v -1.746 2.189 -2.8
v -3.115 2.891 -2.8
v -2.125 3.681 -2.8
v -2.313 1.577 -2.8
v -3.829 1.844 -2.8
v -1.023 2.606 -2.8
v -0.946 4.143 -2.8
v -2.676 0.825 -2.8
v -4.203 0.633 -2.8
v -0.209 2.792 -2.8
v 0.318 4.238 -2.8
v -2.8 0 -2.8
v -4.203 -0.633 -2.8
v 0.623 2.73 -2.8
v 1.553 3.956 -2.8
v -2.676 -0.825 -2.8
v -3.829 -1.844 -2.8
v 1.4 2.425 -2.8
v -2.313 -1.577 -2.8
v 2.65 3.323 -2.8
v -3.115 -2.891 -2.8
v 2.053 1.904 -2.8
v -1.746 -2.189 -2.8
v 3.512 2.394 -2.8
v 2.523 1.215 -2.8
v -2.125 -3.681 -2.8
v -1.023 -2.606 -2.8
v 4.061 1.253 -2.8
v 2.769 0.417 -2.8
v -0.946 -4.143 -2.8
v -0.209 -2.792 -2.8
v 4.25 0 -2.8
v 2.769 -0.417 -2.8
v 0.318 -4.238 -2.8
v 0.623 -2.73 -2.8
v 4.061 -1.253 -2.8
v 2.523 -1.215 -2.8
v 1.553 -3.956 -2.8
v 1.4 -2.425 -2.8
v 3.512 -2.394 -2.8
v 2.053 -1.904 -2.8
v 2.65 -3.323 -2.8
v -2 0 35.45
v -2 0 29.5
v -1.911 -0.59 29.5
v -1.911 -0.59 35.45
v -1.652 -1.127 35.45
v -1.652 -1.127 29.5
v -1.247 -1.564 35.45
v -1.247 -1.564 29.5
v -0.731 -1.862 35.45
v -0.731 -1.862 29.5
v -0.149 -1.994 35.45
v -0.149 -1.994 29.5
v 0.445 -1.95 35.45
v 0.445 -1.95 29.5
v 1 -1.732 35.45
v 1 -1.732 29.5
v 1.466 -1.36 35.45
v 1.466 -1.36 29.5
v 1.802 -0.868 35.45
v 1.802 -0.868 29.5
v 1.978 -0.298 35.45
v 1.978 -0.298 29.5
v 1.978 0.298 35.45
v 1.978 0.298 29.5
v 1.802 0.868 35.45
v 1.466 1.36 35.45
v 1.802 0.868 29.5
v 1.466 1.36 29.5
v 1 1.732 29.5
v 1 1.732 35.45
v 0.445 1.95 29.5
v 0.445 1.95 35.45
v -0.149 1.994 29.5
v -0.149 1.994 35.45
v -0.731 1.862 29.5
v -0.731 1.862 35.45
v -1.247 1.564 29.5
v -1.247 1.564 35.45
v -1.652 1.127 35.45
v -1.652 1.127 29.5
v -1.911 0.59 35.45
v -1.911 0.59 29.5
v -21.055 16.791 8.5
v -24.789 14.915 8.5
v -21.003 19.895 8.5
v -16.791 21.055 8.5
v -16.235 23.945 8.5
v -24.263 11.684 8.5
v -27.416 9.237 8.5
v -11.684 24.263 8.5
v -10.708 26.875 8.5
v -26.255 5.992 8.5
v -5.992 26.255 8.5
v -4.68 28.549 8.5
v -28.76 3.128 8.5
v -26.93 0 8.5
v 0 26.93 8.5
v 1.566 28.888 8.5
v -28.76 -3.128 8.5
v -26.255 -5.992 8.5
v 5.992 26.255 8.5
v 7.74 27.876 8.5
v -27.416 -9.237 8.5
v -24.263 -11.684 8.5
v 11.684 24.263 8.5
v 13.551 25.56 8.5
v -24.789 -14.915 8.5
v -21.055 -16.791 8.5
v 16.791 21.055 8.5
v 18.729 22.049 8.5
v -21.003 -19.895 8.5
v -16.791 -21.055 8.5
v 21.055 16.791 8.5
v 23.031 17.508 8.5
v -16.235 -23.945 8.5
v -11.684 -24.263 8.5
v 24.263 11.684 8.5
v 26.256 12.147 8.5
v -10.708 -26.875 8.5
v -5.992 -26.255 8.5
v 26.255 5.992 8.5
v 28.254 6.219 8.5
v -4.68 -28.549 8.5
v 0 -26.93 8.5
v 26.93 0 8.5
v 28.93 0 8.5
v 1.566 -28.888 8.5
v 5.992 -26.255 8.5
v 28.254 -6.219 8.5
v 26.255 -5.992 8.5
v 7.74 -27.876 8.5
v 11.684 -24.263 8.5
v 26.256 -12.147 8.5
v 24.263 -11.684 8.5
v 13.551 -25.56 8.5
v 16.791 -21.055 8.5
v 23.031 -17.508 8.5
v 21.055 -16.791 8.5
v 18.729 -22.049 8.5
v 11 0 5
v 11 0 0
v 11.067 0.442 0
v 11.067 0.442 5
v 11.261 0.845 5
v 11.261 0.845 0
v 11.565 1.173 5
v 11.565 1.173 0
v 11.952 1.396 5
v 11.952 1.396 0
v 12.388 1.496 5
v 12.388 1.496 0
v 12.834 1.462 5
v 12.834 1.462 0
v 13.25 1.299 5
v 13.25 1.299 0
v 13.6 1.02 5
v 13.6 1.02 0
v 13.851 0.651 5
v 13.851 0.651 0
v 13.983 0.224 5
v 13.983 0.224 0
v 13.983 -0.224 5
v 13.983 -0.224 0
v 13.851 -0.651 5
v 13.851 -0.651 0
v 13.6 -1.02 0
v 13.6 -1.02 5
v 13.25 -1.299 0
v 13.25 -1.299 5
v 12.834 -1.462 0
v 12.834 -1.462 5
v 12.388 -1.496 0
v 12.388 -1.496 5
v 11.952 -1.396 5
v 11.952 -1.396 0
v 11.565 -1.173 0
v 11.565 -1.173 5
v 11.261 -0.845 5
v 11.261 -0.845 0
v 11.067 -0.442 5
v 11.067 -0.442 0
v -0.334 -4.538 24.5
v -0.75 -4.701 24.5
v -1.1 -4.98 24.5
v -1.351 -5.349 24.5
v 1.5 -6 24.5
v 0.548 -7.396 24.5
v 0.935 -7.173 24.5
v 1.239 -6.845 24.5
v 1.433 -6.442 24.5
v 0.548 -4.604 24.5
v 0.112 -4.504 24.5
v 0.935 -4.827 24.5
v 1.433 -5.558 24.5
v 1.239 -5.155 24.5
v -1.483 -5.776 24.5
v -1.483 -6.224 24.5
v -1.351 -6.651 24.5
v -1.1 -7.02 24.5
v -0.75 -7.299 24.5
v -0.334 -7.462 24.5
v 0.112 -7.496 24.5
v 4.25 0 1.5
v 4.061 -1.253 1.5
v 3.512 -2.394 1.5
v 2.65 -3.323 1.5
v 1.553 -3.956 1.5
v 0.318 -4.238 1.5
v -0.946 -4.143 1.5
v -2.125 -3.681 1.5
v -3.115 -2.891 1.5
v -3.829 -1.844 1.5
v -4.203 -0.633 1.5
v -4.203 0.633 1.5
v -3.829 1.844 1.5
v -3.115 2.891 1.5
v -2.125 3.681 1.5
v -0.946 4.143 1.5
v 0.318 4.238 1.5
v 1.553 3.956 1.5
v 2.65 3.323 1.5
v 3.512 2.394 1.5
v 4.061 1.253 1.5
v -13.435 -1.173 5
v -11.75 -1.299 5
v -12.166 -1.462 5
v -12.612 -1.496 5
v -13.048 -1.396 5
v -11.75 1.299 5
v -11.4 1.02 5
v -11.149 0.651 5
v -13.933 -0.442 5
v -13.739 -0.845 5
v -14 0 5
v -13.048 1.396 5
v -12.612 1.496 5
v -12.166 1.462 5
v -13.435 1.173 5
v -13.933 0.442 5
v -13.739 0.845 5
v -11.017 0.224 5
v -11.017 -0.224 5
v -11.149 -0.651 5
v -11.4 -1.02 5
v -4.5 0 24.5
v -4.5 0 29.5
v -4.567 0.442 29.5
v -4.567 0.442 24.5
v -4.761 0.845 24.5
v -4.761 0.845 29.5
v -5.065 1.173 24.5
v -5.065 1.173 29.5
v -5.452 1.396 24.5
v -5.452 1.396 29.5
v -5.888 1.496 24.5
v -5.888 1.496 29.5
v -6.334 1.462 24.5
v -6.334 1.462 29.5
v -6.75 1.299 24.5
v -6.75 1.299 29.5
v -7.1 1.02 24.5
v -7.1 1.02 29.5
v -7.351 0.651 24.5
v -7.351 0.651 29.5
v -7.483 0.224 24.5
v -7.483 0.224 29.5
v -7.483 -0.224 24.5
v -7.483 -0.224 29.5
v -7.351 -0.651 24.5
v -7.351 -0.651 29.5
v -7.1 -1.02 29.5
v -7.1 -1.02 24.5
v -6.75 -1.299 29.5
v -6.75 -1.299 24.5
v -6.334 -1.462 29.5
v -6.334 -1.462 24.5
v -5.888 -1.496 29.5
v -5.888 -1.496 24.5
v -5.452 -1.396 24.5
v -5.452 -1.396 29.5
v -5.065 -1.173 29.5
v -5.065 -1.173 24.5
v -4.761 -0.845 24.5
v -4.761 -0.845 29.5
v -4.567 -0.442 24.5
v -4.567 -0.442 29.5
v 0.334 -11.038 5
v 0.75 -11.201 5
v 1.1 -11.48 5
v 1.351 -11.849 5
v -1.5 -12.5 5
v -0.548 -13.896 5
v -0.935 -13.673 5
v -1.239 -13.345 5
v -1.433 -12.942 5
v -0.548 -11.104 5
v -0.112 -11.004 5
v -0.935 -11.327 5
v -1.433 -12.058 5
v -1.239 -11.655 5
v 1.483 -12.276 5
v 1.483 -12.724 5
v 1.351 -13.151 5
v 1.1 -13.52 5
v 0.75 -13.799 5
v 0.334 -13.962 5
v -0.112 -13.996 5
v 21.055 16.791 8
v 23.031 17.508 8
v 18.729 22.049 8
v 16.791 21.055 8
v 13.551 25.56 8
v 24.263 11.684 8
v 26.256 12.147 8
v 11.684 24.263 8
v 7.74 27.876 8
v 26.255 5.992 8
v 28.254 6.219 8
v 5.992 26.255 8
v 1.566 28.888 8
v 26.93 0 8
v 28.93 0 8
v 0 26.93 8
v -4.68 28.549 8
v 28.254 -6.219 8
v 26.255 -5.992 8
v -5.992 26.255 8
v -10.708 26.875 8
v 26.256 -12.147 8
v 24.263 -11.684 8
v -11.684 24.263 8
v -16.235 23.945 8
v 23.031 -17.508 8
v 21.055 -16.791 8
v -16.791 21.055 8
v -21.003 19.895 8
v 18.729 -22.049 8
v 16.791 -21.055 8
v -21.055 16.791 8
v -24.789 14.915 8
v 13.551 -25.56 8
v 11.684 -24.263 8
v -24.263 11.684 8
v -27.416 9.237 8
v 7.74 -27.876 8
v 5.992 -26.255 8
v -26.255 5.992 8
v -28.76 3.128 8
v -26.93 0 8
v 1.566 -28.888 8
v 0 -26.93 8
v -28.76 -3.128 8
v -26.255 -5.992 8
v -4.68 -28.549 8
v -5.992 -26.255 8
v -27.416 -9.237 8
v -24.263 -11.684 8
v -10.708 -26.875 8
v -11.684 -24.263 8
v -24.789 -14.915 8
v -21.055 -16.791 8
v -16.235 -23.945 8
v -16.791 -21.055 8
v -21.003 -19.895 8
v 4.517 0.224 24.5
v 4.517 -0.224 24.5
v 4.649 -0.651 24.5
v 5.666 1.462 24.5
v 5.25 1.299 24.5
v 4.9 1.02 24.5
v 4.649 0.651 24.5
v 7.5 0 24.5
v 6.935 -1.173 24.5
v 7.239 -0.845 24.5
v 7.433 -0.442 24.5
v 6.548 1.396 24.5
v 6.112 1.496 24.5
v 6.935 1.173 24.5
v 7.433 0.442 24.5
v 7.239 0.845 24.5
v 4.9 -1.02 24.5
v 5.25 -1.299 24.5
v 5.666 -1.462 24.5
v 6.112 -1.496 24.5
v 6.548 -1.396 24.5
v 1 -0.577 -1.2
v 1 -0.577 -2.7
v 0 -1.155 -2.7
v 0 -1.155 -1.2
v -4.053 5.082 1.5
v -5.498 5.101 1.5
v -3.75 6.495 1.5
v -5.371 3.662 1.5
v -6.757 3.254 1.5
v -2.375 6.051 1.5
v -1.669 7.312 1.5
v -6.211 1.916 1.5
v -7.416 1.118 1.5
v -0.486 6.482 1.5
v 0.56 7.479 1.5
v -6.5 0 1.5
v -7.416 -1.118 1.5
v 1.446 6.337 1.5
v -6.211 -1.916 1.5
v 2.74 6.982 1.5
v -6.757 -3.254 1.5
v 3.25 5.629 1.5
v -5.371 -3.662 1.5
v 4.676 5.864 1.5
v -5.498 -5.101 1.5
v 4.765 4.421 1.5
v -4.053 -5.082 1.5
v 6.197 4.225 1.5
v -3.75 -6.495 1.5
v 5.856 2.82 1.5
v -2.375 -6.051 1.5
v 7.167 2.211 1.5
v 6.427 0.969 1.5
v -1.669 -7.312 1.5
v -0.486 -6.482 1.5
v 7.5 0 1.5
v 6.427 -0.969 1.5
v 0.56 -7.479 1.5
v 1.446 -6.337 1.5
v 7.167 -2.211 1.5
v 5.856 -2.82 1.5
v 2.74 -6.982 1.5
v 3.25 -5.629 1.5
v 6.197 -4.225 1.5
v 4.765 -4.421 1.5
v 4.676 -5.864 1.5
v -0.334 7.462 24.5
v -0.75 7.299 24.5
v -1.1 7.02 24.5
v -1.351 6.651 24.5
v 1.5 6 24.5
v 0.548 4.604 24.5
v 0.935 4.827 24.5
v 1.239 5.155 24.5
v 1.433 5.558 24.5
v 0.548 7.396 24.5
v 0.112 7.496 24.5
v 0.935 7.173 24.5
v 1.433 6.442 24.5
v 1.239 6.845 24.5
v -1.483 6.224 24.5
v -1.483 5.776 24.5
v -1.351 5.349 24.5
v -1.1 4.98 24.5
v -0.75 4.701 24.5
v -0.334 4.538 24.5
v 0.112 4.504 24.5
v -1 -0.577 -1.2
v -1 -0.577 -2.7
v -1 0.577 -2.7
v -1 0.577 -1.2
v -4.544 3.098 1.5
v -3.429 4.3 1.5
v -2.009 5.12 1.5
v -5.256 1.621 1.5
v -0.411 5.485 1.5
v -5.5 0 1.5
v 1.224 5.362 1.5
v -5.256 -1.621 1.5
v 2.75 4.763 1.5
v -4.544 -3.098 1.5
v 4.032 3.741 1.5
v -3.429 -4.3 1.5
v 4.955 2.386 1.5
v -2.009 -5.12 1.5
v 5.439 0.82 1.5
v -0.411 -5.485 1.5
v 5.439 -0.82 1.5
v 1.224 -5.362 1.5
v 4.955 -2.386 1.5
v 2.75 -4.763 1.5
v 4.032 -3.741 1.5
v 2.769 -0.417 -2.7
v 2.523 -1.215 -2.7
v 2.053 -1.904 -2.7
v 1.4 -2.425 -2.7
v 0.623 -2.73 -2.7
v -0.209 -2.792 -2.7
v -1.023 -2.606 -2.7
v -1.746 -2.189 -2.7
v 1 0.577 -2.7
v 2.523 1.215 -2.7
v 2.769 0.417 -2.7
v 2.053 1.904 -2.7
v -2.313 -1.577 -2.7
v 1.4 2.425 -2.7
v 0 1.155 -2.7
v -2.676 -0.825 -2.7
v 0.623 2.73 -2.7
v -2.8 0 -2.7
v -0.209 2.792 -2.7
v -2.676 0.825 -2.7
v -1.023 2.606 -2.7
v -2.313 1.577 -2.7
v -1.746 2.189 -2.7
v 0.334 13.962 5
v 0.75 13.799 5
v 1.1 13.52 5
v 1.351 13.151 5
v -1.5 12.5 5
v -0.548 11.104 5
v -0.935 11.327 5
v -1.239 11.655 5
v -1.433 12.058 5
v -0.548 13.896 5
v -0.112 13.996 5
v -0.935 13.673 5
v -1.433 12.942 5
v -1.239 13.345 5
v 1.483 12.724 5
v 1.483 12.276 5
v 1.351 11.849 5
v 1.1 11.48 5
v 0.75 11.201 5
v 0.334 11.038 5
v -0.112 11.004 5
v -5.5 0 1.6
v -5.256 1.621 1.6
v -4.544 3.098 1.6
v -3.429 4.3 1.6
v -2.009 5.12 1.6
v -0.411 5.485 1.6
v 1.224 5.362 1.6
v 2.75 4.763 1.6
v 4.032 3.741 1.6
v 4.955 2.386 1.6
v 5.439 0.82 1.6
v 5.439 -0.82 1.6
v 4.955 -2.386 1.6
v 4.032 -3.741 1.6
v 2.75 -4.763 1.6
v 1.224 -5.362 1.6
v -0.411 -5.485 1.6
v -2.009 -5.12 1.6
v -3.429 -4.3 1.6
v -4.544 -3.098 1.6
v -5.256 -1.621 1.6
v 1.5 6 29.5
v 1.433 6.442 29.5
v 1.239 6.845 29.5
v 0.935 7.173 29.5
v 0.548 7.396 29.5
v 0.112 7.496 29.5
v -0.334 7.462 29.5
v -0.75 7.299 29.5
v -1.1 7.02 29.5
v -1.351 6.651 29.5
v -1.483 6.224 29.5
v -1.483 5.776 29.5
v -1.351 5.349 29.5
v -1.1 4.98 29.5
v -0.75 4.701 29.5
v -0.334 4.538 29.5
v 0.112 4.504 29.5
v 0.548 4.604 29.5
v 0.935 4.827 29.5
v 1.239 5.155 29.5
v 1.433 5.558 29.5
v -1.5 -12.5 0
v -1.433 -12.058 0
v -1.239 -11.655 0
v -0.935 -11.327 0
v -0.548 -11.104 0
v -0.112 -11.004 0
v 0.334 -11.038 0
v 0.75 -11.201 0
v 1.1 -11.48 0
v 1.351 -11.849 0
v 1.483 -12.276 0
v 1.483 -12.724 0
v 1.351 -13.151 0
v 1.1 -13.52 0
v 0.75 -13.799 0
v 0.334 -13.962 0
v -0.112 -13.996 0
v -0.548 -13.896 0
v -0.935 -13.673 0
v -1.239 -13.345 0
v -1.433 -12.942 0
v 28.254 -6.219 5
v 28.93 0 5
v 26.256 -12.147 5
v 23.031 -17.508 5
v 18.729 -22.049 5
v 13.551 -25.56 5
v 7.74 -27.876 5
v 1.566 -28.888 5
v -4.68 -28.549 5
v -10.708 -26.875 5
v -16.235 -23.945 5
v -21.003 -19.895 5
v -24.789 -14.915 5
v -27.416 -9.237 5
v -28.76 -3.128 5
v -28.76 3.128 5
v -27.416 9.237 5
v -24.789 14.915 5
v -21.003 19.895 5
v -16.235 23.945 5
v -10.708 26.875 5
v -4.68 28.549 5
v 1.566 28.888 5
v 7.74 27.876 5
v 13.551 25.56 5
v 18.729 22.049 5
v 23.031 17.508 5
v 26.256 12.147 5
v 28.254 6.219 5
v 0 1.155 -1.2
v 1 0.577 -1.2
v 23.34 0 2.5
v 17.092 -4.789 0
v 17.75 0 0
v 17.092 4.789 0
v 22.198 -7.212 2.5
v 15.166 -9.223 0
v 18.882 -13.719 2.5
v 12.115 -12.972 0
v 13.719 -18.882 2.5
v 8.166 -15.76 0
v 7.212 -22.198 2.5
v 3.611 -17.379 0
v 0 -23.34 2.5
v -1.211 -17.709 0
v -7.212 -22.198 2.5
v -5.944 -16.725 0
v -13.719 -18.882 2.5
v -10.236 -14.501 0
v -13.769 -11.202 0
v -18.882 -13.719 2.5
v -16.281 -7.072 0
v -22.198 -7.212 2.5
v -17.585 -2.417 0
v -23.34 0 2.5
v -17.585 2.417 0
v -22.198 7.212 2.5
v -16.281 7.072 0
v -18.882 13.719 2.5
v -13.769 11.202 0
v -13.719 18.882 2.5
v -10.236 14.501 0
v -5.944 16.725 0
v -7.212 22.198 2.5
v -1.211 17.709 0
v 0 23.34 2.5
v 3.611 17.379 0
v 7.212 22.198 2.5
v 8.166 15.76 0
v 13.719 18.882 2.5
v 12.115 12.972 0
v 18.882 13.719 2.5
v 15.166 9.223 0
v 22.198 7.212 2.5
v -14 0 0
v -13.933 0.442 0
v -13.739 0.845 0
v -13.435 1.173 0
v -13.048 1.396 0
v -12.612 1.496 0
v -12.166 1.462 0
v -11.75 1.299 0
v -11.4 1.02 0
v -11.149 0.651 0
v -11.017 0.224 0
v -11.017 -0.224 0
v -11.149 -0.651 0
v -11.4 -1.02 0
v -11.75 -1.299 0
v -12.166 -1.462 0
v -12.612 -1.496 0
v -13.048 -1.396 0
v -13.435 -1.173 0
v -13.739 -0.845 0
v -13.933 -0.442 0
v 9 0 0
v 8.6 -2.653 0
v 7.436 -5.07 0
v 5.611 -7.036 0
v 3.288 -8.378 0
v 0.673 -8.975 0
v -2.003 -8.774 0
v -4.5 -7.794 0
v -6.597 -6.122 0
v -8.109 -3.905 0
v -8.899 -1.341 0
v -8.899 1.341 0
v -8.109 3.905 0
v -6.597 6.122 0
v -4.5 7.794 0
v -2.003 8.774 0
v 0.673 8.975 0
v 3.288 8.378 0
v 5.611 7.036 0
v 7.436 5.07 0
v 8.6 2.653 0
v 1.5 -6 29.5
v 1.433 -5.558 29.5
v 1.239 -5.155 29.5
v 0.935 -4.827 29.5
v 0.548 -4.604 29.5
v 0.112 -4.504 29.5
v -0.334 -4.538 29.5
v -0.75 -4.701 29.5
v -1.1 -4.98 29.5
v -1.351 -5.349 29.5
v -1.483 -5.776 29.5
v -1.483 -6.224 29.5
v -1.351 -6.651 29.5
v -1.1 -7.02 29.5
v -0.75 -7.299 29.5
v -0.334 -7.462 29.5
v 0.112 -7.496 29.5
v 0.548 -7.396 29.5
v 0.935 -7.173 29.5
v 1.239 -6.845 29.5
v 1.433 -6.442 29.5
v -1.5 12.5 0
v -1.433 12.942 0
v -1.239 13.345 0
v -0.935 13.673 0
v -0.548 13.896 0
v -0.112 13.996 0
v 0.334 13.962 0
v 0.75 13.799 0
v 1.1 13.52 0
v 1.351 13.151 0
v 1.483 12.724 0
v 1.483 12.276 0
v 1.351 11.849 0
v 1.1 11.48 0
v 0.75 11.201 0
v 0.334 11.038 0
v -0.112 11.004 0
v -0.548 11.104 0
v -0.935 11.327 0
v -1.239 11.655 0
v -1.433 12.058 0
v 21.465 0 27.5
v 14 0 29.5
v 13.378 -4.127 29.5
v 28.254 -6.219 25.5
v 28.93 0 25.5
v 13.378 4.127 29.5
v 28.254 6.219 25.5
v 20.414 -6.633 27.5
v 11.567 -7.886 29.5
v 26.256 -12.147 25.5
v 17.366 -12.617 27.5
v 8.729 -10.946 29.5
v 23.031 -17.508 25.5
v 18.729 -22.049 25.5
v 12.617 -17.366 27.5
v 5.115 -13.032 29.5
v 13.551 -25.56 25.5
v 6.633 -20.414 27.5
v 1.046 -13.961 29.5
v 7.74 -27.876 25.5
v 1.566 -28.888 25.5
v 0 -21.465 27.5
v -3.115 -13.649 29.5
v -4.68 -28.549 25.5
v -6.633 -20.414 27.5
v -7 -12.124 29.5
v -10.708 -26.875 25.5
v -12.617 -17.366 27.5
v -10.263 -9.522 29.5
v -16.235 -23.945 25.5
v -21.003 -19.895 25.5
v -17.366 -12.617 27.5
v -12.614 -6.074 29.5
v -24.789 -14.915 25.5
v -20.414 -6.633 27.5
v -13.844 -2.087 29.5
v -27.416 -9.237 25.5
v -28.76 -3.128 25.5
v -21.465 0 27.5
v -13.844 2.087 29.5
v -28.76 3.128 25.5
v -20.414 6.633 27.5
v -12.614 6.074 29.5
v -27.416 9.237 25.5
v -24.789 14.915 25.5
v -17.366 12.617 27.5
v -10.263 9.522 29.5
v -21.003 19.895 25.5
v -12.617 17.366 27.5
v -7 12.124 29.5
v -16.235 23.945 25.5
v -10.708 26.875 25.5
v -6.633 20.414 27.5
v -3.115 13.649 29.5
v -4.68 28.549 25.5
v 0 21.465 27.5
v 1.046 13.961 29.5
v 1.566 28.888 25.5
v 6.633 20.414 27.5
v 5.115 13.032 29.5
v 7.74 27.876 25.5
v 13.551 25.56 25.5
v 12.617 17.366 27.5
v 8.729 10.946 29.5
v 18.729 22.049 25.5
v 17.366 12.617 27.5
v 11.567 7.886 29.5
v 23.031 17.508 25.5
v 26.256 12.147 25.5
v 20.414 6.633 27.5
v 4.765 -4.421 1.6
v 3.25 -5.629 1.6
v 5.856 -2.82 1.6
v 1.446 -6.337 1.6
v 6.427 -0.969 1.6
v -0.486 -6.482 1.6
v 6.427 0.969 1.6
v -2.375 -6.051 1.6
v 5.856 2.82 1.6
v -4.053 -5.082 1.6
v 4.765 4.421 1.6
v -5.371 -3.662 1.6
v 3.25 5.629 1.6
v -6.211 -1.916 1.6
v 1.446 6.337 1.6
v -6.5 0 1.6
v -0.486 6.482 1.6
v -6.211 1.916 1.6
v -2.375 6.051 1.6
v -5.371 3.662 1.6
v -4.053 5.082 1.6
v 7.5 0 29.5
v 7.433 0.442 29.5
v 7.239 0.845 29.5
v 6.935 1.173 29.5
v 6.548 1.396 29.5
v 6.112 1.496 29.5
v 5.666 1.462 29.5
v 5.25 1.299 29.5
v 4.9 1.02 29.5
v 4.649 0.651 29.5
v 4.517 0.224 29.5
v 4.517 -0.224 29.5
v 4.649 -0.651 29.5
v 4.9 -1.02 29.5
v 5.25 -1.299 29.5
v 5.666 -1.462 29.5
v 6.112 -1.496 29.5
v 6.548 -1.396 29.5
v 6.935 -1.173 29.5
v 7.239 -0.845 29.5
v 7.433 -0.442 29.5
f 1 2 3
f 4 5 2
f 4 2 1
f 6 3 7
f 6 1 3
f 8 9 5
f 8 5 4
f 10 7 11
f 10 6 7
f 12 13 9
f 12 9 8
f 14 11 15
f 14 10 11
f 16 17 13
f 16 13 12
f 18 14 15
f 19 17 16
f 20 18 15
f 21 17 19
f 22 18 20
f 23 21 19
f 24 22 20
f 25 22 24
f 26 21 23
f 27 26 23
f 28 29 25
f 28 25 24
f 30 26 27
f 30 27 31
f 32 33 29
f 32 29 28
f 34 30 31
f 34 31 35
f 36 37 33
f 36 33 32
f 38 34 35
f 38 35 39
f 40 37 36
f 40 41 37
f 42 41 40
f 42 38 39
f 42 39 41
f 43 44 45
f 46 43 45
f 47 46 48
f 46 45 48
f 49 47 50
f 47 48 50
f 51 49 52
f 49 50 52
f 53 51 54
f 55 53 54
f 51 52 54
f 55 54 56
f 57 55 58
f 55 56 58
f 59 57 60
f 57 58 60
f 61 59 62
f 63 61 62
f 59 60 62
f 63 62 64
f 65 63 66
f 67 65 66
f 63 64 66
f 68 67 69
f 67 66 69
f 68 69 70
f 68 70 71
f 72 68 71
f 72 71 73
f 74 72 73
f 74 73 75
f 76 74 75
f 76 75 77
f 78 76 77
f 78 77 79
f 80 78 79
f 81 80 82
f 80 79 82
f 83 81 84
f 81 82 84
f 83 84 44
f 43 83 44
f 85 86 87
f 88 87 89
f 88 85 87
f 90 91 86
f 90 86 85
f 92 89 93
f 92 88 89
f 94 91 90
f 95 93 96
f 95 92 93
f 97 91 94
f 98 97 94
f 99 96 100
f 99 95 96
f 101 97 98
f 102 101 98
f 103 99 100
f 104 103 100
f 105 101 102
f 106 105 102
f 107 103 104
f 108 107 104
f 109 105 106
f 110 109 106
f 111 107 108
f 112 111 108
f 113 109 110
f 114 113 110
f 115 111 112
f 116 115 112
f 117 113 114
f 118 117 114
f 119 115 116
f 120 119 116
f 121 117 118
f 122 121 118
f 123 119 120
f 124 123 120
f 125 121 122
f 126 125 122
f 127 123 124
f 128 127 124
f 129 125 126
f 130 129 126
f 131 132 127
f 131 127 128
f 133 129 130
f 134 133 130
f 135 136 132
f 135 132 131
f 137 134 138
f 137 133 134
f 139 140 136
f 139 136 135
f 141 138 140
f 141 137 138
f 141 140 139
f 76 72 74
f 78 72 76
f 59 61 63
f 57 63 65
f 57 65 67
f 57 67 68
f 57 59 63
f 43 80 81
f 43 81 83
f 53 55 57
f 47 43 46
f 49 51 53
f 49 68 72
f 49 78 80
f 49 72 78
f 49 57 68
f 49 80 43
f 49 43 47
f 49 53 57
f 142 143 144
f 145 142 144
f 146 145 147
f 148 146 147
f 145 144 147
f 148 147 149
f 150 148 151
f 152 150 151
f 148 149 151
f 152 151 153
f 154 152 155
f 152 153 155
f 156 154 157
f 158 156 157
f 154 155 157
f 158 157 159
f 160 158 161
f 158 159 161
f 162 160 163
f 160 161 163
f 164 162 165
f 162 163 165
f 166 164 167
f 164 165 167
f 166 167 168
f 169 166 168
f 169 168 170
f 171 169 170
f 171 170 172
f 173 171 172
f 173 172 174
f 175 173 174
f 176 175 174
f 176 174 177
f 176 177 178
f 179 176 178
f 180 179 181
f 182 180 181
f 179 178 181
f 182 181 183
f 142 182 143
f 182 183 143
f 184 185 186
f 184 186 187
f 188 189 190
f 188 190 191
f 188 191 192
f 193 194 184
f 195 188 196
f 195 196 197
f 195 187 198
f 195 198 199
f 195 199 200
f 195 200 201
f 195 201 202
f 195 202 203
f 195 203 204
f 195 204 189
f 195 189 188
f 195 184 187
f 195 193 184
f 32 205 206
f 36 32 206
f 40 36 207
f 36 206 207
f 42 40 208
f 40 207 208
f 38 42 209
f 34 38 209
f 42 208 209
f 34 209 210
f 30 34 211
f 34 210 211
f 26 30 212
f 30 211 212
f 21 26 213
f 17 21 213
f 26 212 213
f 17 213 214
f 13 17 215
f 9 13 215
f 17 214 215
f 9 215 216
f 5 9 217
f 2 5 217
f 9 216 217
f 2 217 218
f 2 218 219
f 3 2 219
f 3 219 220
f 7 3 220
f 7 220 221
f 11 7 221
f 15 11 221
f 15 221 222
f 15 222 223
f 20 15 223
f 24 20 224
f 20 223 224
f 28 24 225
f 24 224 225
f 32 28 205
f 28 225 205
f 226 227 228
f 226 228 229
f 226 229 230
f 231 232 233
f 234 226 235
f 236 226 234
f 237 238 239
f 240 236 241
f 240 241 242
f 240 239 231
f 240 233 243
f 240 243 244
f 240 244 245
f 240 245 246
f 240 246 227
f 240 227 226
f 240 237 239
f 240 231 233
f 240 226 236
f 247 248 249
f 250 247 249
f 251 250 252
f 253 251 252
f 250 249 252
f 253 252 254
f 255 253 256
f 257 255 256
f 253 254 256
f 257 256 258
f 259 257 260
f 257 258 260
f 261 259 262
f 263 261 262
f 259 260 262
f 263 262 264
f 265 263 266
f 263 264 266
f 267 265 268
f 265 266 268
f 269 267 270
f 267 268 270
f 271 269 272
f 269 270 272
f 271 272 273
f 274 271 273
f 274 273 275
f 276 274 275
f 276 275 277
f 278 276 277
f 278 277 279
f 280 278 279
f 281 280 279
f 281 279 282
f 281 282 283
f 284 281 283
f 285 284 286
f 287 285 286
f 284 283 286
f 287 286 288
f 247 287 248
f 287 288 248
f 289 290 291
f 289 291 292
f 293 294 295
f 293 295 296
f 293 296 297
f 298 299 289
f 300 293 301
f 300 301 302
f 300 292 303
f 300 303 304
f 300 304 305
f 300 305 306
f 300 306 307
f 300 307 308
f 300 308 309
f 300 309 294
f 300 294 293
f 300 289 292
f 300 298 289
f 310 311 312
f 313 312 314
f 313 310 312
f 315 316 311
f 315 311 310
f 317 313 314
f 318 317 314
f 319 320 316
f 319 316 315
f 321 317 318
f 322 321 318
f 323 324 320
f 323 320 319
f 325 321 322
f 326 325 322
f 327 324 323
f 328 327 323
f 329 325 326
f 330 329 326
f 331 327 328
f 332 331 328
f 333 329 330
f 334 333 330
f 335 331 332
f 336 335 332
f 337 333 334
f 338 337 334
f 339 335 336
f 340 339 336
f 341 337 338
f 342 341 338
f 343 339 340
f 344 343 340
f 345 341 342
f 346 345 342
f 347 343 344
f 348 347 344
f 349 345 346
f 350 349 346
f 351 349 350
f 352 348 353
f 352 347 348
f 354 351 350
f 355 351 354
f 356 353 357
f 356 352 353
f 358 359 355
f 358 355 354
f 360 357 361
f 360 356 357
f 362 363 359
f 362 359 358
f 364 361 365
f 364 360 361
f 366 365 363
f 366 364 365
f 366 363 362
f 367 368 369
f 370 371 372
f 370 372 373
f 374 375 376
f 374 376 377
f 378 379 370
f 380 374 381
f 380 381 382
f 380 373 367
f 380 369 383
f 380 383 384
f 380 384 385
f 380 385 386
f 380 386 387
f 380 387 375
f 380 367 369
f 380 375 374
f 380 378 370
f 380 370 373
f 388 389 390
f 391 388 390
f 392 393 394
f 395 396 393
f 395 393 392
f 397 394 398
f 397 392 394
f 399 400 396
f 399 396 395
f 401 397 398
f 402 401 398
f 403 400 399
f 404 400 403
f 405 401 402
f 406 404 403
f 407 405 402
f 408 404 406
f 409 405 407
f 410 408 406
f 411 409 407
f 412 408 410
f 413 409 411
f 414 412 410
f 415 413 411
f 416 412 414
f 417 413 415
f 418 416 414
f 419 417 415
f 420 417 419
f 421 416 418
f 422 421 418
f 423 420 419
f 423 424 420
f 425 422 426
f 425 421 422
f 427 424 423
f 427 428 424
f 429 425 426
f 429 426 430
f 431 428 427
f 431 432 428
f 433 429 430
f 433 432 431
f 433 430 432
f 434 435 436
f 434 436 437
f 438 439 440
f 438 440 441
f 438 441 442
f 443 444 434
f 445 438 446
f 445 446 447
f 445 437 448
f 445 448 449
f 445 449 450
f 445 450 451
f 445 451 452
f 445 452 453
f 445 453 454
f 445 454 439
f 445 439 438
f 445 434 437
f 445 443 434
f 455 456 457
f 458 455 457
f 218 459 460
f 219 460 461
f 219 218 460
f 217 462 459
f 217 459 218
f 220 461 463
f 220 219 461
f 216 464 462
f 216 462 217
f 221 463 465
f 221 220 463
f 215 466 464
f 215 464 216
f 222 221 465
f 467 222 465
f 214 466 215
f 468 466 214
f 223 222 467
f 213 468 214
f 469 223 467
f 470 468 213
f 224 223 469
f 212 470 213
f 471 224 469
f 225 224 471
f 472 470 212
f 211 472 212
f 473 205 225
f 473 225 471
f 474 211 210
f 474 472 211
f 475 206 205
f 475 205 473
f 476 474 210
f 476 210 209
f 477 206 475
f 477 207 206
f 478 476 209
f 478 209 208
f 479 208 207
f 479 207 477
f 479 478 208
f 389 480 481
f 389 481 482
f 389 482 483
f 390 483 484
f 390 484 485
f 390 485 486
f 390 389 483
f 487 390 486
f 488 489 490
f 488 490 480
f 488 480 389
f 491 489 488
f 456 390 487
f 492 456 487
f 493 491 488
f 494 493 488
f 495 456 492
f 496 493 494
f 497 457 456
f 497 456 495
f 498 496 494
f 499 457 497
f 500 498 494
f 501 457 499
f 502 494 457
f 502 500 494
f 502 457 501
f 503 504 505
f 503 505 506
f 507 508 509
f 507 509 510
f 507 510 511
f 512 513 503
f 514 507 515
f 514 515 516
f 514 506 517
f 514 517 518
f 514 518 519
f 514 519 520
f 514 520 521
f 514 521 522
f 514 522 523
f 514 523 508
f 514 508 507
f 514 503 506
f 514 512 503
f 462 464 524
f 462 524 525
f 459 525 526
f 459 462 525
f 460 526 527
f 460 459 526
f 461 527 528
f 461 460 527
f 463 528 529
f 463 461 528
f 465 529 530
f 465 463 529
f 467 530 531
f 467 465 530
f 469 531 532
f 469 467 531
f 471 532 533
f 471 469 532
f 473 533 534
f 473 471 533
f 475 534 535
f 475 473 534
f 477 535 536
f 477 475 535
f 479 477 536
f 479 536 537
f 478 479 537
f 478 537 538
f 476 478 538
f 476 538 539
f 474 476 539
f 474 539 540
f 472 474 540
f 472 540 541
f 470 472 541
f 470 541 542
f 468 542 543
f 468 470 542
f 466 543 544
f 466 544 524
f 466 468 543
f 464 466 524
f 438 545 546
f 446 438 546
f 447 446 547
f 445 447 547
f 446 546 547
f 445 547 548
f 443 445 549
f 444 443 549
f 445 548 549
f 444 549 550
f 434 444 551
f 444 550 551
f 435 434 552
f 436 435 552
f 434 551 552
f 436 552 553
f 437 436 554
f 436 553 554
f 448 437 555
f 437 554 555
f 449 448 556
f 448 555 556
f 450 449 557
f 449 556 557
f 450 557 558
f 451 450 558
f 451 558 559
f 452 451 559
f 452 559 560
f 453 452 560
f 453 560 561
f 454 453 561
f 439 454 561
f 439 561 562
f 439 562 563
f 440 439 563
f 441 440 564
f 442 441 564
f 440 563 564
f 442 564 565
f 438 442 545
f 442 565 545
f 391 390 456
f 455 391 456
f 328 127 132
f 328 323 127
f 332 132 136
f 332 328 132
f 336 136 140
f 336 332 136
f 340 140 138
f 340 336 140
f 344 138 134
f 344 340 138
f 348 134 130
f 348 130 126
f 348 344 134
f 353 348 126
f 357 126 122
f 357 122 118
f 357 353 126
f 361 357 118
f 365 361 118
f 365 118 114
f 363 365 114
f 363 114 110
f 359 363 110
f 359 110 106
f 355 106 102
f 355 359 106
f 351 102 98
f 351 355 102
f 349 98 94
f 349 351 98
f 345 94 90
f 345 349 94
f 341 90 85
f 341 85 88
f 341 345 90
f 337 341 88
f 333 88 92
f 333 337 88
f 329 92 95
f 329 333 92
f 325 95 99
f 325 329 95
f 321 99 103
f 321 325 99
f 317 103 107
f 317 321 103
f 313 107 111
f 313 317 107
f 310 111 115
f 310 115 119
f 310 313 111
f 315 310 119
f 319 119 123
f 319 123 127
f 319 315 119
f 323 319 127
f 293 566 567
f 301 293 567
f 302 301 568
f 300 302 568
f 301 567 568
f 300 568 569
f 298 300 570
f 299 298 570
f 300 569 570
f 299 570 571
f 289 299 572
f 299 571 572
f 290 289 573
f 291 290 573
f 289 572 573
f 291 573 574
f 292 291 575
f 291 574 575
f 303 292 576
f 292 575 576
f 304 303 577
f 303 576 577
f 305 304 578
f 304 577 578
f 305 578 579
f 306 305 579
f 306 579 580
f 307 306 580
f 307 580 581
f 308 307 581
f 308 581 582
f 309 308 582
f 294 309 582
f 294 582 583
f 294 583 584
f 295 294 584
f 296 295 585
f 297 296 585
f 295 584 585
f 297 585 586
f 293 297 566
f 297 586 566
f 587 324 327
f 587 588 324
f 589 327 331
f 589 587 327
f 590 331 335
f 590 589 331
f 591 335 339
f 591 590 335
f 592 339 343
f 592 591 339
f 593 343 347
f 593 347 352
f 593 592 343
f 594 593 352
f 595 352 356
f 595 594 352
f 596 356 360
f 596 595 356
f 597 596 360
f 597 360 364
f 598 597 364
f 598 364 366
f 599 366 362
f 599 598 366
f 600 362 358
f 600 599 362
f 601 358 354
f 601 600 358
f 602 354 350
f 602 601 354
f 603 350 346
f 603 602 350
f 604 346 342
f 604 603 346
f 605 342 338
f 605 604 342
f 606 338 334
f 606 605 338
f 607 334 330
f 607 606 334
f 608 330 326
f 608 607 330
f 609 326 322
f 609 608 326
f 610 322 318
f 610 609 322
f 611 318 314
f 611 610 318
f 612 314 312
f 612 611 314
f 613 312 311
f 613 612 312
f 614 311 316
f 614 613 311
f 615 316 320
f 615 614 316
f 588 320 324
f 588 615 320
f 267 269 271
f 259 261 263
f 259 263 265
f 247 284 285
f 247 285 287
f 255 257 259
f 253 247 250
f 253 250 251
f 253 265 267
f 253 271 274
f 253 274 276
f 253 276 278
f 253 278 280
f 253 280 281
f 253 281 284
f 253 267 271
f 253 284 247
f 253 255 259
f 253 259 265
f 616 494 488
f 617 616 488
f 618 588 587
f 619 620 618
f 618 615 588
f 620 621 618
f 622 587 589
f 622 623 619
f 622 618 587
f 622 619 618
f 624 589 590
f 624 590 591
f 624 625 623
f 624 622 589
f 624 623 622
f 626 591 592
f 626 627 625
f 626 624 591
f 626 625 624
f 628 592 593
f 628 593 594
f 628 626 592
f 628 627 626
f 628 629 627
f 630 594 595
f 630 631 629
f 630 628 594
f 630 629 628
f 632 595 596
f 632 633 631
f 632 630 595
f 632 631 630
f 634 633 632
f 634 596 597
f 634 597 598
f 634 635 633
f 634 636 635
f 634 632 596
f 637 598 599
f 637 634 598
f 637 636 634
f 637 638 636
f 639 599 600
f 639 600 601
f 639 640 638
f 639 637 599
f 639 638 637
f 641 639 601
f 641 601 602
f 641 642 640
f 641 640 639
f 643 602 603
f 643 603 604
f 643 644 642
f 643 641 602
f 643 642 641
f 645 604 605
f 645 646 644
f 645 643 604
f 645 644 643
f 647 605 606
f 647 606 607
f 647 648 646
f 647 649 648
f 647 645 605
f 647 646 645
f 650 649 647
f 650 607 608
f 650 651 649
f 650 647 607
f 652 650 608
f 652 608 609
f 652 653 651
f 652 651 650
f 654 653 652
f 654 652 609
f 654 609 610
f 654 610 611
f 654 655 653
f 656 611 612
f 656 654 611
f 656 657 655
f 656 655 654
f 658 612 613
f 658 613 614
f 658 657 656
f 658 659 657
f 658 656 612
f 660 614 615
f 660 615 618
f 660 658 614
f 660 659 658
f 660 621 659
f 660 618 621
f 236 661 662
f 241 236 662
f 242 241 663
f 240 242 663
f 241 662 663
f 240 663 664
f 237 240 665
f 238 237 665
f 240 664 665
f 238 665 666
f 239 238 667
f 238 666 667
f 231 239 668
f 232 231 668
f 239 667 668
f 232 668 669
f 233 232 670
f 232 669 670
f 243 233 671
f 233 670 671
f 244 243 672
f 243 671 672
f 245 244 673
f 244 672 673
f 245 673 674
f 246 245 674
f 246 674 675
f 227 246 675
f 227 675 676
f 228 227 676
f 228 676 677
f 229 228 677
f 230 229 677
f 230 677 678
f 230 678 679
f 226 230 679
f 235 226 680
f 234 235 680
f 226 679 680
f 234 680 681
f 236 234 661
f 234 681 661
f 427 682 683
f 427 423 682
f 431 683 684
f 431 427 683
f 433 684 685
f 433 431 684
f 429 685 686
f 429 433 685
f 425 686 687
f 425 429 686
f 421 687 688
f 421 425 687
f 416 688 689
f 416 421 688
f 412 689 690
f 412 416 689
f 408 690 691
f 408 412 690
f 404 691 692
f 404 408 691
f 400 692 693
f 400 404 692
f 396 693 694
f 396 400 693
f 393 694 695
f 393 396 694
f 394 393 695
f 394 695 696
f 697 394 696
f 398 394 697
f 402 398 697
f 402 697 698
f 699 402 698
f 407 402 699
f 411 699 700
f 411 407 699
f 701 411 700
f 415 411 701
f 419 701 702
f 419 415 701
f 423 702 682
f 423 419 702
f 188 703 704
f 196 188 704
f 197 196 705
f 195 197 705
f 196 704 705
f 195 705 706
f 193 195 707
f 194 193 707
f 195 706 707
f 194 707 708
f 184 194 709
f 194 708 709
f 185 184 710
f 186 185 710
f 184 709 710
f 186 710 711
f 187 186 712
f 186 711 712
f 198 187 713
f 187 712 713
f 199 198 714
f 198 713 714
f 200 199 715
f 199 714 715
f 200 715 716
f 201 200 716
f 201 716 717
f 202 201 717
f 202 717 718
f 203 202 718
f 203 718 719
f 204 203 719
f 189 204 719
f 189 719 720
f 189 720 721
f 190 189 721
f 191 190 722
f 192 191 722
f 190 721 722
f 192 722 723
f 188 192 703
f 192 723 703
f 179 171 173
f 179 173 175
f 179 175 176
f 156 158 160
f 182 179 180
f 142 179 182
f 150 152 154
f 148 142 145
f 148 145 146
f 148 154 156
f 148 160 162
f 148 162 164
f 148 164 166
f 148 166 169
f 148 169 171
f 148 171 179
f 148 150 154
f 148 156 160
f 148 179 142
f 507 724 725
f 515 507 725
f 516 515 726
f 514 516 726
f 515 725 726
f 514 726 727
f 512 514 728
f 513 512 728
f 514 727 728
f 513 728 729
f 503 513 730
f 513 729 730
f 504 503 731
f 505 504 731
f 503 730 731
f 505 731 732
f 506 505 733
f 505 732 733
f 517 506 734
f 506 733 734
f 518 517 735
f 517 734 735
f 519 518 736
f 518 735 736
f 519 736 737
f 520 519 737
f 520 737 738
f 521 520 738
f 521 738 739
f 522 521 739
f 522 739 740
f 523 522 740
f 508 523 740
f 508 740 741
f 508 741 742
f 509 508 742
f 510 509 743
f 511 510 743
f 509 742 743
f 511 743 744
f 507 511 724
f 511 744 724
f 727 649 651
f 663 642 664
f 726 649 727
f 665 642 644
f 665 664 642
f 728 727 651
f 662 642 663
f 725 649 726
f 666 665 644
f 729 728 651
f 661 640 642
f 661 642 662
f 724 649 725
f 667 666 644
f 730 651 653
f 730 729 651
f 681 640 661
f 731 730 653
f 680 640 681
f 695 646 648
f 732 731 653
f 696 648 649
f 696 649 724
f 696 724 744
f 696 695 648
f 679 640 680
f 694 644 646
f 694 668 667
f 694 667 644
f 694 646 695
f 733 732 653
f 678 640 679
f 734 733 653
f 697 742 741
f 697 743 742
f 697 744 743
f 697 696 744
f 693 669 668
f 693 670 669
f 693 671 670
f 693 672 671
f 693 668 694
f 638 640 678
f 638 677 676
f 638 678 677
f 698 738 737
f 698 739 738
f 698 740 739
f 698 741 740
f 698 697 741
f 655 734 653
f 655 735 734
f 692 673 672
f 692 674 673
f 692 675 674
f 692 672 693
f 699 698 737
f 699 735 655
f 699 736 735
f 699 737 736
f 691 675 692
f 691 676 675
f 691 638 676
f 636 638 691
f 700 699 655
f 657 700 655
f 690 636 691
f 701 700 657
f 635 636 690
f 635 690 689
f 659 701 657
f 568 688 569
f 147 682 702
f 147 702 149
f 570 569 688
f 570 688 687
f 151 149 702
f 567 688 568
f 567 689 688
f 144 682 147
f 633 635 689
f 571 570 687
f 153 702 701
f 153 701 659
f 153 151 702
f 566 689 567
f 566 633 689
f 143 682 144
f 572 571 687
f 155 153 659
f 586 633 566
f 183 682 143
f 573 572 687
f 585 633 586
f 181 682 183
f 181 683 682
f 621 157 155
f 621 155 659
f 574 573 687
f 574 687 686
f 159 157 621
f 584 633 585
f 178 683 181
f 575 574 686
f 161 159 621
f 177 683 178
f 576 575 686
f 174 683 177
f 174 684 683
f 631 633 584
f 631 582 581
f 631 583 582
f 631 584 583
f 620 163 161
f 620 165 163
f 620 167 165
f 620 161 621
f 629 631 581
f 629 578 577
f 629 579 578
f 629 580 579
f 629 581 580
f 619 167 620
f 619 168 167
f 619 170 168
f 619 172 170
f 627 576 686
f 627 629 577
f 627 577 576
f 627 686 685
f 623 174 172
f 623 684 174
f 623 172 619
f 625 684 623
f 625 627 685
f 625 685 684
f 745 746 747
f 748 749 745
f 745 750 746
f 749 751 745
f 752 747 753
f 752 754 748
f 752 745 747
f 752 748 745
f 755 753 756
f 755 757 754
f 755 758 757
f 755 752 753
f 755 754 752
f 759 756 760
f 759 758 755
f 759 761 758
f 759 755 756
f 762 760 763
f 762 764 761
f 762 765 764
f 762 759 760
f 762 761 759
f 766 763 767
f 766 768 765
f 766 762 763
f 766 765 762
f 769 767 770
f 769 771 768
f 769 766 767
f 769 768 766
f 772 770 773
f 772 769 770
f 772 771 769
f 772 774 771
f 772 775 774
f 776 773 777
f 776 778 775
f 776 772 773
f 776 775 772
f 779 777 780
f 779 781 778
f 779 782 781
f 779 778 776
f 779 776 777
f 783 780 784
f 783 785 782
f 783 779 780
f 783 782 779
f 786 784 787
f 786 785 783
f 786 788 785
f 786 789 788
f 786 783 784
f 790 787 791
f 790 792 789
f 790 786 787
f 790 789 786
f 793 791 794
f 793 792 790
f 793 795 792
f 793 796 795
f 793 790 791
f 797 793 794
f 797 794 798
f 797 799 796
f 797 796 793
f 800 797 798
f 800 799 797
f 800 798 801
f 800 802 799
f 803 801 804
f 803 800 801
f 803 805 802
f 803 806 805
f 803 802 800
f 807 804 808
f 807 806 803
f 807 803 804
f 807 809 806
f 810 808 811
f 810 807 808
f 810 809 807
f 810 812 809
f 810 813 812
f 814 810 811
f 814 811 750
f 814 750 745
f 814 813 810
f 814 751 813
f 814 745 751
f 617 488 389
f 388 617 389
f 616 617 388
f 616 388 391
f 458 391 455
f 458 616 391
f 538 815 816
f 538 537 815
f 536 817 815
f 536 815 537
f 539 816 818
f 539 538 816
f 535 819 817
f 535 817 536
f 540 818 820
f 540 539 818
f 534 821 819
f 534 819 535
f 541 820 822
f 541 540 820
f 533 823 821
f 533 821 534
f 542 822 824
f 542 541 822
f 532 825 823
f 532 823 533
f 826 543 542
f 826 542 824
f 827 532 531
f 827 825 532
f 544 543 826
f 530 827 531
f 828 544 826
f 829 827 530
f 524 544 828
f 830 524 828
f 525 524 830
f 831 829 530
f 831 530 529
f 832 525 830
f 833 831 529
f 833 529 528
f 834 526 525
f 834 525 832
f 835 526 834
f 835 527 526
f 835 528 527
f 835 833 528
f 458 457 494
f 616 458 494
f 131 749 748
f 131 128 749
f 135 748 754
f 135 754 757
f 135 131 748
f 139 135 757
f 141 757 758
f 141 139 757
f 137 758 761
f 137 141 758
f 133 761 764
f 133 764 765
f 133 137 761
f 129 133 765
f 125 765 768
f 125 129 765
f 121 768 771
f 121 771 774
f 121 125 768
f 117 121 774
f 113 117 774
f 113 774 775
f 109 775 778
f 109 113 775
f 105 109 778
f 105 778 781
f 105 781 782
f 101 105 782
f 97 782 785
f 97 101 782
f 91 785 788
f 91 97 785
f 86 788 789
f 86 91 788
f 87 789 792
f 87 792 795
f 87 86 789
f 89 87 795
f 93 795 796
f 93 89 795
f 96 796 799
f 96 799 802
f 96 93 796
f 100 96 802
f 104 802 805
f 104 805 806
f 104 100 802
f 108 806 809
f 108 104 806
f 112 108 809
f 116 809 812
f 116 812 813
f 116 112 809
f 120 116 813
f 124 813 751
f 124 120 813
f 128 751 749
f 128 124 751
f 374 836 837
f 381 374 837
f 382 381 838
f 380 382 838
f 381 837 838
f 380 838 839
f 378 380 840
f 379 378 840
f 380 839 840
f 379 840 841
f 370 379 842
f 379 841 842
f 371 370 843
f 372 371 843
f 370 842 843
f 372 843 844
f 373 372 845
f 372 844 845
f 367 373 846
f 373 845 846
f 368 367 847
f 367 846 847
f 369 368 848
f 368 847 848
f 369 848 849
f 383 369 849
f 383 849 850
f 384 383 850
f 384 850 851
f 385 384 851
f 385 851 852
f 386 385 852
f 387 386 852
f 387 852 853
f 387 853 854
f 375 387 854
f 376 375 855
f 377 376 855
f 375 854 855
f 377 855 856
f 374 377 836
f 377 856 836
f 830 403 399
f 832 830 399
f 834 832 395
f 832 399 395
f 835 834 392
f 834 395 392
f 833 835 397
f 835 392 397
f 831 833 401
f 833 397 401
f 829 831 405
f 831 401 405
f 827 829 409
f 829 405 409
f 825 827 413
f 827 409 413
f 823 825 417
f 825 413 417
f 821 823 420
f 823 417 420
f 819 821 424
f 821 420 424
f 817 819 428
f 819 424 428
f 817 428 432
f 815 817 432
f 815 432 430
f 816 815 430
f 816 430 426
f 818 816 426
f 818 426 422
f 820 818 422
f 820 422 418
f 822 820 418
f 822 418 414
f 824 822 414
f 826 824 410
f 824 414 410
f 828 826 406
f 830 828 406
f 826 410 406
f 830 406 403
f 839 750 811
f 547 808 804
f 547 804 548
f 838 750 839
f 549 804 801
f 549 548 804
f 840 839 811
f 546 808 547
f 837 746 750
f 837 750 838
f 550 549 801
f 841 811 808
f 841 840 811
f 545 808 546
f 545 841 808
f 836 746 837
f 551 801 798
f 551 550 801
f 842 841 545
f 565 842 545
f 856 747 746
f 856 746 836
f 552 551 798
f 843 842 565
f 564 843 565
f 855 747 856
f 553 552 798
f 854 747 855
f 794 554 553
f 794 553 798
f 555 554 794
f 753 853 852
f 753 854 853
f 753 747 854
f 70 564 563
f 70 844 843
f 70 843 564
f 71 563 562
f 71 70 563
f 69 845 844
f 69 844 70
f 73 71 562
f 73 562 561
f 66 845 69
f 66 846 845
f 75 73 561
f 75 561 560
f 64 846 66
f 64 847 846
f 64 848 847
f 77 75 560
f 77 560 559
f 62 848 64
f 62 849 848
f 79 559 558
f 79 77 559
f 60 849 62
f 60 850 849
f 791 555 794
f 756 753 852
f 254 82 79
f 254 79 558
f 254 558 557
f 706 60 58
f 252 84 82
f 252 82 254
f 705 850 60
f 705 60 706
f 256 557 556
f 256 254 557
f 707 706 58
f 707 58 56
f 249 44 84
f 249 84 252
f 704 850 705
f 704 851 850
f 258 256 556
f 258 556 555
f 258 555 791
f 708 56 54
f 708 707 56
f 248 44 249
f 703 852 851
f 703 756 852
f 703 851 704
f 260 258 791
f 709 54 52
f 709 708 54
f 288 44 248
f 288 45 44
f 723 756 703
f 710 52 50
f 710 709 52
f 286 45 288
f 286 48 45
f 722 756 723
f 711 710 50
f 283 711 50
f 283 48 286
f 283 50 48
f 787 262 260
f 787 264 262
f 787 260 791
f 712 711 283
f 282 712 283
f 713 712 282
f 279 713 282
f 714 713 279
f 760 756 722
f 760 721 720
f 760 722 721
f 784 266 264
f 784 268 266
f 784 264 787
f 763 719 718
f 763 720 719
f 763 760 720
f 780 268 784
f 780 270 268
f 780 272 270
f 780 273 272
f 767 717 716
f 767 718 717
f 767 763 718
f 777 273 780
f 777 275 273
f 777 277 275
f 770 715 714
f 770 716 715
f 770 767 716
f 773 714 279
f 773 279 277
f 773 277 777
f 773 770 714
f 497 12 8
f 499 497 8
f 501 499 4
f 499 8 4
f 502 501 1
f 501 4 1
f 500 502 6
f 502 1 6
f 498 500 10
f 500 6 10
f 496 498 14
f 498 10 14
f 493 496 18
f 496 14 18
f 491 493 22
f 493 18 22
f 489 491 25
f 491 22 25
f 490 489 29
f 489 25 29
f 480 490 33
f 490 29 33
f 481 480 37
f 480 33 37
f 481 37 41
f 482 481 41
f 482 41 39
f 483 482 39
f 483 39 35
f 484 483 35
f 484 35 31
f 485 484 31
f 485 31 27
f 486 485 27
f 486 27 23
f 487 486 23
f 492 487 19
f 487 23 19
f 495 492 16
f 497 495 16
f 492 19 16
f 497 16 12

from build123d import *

# Parameters (mm, degrees)
SKETCH4_R           = 2
BOSS_EXTRUDE1_DEPTH = 5.95
SKETCH5_R           = 1.5
CUT_EXTRUDE1_DEPTH  = 5
SKETCH6_R           = 1.5
CUT_EXTRUDE2_DEPTH  = 5
SKETCH7_R           = 4.25
BOSS_EXTRUDE2_DEPTH = 4.3
SKETCH8_R           = 2.8
CUT_EXTRUDE3_DEPTH  = 0.1
CUT_EXTRUDE4_DEPTH  = 1.5
SKETCH10_R          = 6.5
SKETCH10_R_2        = 5.5
CUT_EXTRUDE5_DEPTH  = 0.1


with BuildPart() as part:
    # Sketch3 → Revolve1 (revolve)
    with BuildSketch(Plane(origin=(0, 0, 0), x_dir=(0, 0, -1), z_dir=(1, 0, 0)), mode=Mode.PRIVATE) as revolve1_sk:
        Polygon((-29.5, 0), (-29.5, 14), (-25.5, 28.93), (-8.5, 28.93), (-8.5, 26.93), (-8, 26.93), (-8, 28.93), (-5, 28.93), (0, 17.75), (0, 9), (-1.5, 7.5), (-1.5, 0), align=None)
    revolve(revolve1_sk.sketch.rotate(Axis((0, 0, 66.283384922), (0, 0, -1)), 90), axis=Axis((0, 0, 66.283384922), (0, 0, -1)))

    # Sketch4 → Boss-Extrude1 (add)
    with BuildSketch(Plane.XY.offset(29.5)):
        with Locations(Location((0, 0, 0), (0, 0, 180))):
            Circle(SKETCH4_R)
    extrude(amount=BOSS_EXTRUDE1_DEPTH)

    # Sketch5 → Cut-Extrude1 (cut)
    with BuildSketch(Plane.XY.offset(29.5)):
        with Locations((0, 6)):
            Circle(SKETCH5_R)
        with Locations((6, 0)):
            Circle(SKETCH5_R)
        with Locations((0, -6)):
            Circle(SKETCH5_R)
        with Locations((-6, 0)):
            Circle(SKETCH5_R)
    extrude(amount=-CUT_EXTRUDE1_DEPTH, mode=Mode.SUBTRACT)

    # Sketch6 → Cut-Extrude2 (cut)
    with BuildSketch(Plane(origin=(0, 0, 0), x_dir=(-1, 0, 0), z_dir=(0, 0, -1))):
        with Locations((0, 12.5)):
            Circle(SKETCH6_R)
        with Locations((12.5, 0)):
            Circle(SKETCH6_R)
        with Locations((0, -12.5)):
            Circle(SKETCH6_R)
        with Locations((-12.5, 0)):
            Circle(SKETCH6_R)
    extrude(amount=-CUT_EXTRUDE2_DEPTH, mode=Mode.SUBTRACT)

    # Sketch7 → Boss-Extrude2 (add)
    with BuildSketch(Plane(origin=(0, 0, 1.5), x_dir=(-1, 0, 0), z_dir=(0, 0, -1))):
        with Locations(Location((0, 0, 0), (0, 0, 180))):
            Circle(SKETCH7_R)
    extrude(amount=BOSS_EXTRUDE2_DEPTH)

    # Sketch8 → Cut-Extrude3 (cut)
    with BuildSketch(Plane(origin=(0, 0, -2.8), x_dir=(-1, 0, 0), z_dir=(0, 0, -1))):
        Circle(SKETCH8_R)
    extrude(amount=-CUT_EXTRUDE3_DEPTH, mode=Mode.SUBTRACT)

    # Sketch9 → Cut-Extrude4 (cut)
    with BuildSketch(Plane(origin=(0, 0, -2.7), x_dir=(-1, 0, 0), z_dir=(0, 0, -1))):
        Polygon((0, -1.154700538), (1, -0.577350269), (1, 0.577350269), (0, 1.154700538), (-1, 0.577350269), (-1, -0.577350269), align=None)
    extrude(amount=-CUT_EXTRUDE4_DEPTH, mode=Mode.SUBTRACT)

    # Sketch10 → Cut-Extrude5 (cut)
    with BuildSketch(Plane(origin=(0, 0, 1.5), x_dir=(-1, 0, 0), z_dir=(0, 0, -1))):
        Circle(SKETCH10_R)
        Circle(SKETCH10_R_2, mode=Mode.SUBTRACT)
    extrude(amount=-CUT_EXTRUDE5_DEPTH, mode=Mode.SUBTRACT)


solid = part.part
